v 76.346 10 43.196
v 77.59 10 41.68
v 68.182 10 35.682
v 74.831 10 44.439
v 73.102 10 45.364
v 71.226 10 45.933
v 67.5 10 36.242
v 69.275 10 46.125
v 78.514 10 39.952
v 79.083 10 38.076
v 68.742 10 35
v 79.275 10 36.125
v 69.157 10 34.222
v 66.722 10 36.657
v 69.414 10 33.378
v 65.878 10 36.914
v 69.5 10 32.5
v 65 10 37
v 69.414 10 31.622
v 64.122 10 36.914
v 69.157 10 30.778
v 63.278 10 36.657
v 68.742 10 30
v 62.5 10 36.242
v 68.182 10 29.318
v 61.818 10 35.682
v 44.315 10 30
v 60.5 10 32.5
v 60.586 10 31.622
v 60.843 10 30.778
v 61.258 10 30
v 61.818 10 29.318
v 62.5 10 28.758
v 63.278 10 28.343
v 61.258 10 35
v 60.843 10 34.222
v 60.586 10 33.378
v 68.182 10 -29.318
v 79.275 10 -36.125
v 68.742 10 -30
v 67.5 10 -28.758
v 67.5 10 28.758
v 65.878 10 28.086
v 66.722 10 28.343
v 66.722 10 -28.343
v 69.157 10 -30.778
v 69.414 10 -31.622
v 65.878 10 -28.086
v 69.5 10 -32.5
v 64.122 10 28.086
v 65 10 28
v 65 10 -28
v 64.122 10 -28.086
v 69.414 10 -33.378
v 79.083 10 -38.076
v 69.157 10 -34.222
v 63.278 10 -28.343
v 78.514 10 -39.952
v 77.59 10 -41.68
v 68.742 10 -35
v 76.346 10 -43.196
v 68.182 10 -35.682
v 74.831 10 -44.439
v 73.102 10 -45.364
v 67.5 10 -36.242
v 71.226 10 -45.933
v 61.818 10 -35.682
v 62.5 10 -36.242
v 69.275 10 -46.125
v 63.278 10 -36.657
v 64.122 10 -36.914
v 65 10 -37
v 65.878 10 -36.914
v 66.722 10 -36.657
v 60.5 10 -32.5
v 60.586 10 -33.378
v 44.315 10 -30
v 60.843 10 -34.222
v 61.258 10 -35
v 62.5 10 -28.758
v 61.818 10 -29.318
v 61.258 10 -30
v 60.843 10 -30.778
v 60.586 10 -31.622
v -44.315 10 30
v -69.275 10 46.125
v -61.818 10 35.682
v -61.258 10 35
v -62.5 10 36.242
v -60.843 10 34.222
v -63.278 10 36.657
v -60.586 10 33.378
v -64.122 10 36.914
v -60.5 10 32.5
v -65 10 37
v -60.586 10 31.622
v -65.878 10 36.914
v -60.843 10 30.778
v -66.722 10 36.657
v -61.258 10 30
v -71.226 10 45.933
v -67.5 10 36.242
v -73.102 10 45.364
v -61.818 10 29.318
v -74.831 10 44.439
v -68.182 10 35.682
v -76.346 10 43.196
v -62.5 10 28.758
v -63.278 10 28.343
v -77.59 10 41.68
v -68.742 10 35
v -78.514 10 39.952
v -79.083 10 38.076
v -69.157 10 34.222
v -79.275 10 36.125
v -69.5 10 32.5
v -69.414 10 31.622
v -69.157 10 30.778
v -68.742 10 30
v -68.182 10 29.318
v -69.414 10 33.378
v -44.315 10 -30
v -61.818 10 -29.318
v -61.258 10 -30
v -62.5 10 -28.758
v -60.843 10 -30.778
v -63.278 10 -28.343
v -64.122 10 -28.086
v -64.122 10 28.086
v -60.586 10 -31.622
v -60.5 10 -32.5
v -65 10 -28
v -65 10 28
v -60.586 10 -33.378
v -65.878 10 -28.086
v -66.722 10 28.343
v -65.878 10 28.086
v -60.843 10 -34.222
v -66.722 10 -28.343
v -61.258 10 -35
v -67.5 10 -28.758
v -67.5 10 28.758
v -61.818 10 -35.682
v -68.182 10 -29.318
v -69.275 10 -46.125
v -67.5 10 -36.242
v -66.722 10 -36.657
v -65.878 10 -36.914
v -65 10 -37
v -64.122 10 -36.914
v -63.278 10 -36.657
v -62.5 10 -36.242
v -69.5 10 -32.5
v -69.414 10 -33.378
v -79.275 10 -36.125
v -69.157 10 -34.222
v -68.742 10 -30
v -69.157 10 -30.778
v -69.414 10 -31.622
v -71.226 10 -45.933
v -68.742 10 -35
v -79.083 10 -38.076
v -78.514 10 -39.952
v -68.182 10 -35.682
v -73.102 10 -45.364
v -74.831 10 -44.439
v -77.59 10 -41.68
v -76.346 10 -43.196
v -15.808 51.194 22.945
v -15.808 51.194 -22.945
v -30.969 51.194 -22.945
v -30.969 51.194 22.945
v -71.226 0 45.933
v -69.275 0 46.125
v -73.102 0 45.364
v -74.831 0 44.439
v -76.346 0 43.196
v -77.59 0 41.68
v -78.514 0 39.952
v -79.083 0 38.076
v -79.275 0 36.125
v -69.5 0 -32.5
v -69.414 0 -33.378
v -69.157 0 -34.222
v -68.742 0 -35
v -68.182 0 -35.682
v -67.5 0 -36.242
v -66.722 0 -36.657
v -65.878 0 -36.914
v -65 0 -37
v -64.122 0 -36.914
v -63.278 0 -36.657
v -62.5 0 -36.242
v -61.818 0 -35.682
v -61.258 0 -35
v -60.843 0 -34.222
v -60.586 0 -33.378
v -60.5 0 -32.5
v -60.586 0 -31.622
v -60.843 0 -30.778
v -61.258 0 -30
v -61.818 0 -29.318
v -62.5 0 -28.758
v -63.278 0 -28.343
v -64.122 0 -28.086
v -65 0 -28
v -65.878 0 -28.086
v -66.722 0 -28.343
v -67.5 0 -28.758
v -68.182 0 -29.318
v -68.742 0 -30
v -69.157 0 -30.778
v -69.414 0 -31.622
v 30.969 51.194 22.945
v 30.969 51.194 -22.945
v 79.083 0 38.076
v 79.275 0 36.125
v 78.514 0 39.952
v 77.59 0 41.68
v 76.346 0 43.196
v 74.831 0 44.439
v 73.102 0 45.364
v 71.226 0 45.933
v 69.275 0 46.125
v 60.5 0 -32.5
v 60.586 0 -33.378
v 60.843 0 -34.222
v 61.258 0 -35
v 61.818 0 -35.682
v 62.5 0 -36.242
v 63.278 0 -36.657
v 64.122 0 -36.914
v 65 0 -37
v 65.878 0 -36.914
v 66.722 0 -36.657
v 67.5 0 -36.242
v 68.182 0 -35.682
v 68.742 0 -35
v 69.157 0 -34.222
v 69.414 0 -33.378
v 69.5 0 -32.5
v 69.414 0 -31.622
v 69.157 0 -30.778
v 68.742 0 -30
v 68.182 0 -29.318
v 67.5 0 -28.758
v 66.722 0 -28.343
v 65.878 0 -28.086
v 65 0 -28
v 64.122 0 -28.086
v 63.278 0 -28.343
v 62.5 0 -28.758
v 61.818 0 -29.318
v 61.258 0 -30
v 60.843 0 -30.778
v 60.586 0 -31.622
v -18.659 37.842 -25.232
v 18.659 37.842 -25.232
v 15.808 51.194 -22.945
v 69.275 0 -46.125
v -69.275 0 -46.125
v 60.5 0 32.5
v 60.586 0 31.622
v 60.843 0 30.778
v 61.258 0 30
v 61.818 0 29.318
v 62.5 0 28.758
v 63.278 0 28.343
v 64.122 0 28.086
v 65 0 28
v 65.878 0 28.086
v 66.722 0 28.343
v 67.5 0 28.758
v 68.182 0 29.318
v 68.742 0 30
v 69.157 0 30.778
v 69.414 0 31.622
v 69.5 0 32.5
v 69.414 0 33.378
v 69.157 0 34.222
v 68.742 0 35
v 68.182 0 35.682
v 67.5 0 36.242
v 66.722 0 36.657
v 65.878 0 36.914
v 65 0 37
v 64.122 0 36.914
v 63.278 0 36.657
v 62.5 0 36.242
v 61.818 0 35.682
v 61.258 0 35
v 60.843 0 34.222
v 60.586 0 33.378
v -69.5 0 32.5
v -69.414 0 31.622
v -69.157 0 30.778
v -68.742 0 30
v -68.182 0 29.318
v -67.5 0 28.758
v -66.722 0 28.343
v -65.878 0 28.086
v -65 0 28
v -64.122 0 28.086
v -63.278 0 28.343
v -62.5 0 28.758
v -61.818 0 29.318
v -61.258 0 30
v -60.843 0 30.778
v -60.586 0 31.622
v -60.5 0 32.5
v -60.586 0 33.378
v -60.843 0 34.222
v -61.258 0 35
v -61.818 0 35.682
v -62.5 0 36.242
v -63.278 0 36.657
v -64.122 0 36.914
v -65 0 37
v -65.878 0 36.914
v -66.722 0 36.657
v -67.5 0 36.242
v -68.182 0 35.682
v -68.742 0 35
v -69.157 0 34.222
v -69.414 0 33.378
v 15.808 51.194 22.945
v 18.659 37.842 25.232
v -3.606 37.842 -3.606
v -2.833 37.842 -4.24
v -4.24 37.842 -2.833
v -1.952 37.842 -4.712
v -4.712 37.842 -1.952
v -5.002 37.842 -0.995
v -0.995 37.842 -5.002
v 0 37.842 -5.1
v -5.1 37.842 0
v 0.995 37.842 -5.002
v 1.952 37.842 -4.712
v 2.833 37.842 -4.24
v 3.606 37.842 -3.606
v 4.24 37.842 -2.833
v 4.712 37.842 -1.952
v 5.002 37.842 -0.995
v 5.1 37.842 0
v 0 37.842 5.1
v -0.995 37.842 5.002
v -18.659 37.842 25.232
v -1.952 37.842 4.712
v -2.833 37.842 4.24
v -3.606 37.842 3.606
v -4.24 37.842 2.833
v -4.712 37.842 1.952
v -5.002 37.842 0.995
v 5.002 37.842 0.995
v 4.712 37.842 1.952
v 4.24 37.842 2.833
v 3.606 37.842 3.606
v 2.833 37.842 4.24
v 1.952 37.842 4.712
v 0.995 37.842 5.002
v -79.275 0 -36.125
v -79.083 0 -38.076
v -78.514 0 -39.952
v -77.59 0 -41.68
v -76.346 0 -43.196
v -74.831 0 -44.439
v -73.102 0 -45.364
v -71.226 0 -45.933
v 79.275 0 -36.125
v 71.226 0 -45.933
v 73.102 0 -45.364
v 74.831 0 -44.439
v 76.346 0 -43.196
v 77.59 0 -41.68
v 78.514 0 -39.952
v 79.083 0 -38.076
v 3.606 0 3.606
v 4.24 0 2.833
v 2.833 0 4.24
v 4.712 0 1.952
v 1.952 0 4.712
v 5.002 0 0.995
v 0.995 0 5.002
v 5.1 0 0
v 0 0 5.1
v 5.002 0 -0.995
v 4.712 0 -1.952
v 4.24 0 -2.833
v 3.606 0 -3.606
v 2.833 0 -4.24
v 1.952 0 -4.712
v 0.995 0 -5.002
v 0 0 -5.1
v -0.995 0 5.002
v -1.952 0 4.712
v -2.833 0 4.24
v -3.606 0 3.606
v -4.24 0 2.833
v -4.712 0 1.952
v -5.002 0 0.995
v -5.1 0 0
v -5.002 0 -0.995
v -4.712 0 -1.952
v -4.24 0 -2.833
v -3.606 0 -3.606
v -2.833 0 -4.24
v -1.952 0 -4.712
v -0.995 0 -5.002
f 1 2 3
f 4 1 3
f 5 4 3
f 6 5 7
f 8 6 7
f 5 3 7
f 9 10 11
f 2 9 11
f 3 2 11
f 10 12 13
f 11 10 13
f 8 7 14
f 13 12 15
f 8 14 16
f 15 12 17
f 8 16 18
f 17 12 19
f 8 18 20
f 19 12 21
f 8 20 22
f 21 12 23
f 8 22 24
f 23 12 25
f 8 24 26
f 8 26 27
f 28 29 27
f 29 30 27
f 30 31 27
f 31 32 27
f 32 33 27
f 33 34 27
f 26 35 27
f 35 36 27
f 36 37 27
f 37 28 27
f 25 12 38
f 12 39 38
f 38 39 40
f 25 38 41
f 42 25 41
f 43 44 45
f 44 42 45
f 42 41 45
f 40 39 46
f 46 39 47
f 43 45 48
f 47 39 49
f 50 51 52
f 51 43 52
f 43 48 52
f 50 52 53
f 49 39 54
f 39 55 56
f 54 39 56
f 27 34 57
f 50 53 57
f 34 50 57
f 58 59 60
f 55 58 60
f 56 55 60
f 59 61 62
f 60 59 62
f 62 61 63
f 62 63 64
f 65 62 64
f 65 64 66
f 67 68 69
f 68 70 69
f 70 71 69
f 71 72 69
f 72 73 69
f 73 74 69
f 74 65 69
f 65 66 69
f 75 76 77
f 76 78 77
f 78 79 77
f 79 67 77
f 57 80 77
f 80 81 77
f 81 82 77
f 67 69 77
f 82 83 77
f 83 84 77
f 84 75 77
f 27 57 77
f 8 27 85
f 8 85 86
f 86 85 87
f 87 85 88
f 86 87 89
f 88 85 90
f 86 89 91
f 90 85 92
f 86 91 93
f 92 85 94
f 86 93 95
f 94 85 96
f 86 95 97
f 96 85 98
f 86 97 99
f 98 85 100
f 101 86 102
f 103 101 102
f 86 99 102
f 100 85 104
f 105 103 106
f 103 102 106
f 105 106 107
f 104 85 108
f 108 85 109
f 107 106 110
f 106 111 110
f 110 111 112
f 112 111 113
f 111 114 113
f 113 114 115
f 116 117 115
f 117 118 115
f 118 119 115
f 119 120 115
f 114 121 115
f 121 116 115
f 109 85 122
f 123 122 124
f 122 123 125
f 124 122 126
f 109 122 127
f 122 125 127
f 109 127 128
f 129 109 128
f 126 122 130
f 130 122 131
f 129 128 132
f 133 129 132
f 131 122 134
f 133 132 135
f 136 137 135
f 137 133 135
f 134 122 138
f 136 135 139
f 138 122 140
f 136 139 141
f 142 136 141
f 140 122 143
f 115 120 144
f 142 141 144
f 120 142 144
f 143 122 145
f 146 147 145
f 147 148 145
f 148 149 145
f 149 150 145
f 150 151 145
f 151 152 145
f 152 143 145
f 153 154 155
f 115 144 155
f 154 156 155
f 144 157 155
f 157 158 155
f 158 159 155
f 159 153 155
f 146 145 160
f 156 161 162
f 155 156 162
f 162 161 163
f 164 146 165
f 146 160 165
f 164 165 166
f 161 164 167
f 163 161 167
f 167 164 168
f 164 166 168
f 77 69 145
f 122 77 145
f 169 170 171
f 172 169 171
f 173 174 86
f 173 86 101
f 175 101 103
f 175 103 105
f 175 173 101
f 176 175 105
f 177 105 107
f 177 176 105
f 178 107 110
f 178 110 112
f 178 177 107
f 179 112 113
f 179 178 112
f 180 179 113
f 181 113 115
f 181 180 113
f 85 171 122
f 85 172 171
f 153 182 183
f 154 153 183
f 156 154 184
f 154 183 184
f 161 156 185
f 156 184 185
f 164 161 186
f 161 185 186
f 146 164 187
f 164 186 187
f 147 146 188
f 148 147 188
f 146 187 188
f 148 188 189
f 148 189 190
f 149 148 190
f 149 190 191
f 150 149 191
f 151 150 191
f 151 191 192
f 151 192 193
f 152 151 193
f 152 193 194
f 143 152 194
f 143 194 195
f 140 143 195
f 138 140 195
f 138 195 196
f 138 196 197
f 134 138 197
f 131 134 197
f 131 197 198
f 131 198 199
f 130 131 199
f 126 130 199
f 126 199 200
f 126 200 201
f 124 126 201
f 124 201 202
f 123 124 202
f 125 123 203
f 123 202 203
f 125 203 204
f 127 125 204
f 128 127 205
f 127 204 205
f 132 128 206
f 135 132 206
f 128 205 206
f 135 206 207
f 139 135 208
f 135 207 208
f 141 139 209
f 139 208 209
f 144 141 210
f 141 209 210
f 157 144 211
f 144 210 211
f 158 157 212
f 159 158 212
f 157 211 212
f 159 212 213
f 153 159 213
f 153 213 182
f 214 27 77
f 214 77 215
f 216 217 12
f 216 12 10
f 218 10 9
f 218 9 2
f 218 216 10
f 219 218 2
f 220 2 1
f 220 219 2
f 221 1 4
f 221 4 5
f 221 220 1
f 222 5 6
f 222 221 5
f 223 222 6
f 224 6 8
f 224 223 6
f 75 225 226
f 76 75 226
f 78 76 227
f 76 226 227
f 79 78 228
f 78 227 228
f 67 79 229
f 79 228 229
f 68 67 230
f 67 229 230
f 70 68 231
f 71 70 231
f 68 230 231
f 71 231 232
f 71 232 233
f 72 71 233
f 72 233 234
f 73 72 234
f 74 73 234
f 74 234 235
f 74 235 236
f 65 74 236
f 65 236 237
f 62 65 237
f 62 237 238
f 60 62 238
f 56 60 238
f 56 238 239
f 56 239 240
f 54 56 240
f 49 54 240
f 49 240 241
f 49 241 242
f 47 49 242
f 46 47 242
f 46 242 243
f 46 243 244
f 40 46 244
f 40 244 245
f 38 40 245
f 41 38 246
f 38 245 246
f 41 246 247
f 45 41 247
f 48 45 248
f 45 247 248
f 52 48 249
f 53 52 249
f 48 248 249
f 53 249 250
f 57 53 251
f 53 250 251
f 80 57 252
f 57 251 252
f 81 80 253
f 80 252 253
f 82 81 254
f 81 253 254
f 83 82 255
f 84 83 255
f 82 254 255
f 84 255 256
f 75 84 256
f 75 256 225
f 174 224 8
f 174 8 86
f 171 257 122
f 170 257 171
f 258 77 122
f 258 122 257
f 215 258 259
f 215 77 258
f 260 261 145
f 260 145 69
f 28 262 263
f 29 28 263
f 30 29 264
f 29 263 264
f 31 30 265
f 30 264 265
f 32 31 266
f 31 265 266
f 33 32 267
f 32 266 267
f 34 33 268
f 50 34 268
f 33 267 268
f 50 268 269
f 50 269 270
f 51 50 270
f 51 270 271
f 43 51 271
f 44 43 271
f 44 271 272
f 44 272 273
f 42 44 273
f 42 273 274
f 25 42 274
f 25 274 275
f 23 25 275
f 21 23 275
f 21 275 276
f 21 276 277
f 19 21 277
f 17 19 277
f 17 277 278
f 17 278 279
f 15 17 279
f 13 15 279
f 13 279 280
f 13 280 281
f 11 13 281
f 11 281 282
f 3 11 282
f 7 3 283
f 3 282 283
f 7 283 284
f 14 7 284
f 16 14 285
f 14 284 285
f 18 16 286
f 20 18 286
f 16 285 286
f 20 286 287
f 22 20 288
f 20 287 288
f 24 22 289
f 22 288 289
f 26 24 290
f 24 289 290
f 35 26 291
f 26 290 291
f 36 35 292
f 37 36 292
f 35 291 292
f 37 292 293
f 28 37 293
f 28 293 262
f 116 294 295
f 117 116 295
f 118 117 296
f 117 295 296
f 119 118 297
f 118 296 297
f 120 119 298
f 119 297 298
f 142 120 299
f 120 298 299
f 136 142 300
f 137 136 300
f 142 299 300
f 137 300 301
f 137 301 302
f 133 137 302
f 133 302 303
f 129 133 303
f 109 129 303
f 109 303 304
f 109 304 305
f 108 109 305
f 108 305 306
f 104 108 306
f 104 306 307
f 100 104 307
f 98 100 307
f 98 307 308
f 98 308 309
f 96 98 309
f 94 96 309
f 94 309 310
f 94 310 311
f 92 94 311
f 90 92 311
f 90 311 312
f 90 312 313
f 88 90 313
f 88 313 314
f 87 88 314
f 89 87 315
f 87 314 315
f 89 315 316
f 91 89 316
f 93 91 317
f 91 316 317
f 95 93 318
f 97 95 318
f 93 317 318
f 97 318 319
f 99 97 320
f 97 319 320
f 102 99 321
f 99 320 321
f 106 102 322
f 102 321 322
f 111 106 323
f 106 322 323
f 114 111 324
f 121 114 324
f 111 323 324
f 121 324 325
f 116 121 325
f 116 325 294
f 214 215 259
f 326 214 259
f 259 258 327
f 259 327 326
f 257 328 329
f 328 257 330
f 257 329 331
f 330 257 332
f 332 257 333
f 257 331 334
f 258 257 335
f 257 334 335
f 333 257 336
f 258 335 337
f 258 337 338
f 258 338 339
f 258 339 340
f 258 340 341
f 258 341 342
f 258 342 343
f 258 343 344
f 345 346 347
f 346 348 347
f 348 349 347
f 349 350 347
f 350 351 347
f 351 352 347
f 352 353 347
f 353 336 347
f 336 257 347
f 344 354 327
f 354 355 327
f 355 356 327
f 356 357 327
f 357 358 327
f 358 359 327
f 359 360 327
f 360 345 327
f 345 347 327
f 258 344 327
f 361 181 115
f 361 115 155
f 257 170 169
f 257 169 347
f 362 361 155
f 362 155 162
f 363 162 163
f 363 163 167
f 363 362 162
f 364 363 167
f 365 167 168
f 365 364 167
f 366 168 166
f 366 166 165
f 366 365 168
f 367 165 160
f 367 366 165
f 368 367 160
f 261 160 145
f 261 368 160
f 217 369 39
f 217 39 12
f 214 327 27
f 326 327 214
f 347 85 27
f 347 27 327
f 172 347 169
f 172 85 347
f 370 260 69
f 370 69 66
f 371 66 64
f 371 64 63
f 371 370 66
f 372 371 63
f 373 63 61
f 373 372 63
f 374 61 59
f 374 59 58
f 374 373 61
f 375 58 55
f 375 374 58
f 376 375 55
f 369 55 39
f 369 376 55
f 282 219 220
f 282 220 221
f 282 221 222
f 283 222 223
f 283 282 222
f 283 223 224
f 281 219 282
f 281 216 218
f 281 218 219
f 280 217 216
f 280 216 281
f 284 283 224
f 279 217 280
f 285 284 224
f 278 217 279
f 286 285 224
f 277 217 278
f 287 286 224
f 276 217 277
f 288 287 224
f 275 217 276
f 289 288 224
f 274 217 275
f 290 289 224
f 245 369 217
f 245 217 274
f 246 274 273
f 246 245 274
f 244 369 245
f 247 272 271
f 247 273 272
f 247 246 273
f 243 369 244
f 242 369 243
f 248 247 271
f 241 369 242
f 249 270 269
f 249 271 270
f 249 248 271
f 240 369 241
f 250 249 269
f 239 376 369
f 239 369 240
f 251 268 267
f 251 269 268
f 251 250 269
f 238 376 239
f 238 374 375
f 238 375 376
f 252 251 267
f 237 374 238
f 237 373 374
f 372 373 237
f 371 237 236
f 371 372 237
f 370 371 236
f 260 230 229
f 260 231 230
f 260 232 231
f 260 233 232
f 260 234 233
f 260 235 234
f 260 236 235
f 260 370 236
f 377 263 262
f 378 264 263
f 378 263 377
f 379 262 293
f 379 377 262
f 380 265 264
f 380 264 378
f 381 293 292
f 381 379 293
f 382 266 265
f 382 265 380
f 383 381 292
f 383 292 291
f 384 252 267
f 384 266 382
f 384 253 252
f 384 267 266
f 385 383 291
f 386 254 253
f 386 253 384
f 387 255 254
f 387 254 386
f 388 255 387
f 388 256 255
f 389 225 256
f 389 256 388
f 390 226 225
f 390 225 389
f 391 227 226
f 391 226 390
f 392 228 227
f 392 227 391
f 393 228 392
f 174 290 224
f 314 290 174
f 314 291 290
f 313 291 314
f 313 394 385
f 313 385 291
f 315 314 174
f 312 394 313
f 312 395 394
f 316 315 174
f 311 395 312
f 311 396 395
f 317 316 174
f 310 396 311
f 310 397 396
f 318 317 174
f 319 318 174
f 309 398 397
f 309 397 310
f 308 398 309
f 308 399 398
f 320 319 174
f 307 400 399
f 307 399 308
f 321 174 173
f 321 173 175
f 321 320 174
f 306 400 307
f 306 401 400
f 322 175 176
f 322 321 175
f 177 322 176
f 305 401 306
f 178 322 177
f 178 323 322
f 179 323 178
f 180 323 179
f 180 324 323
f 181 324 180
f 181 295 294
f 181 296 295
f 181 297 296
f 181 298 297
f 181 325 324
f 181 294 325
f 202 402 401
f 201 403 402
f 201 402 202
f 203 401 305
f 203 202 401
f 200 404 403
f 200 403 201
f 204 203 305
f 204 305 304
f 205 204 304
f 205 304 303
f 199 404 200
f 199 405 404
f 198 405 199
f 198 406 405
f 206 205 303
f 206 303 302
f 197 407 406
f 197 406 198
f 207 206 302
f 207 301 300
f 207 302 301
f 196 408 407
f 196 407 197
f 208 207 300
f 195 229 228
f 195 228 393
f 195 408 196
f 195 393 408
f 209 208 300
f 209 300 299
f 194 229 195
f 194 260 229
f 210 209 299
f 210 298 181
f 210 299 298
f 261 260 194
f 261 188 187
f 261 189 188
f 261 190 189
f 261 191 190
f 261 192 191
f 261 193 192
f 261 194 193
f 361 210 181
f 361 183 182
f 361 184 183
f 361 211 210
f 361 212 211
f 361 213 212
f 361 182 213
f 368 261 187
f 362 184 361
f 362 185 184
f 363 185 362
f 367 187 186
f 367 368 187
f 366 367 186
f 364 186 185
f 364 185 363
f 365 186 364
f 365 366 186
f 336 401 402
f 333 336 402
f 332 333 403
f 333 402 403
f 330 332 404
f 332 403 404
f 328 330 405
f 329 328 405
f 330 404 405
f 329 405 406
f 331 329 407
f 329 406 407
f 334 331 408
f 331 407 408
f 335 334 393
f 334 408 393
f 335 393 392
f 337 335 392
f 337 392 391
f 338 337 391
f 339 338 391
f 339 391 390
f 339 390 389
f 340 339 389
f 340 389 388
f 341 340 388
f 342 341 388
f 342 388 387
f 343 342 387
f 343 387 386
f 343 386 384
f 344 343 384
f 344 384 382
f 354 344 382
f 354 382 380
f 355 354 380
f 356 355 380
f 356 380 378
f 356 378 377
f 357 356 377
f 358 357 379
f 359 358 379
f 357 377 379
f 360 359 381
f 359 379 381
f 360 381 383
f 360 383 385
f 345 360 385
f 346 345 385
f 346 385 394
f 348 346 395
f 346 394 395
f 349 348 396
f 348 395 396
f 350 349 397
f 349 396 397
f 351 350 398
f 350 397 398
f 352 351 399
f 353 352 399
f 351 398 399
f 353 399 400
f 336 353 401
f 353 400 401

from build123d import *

# Parameters (mm, degrees)
AUFSATZ_LINEAR_AUSTRAGEN1_DEPTH      = 10
AUFSATZ_LINEAR_AUSTRAGEN2_DEPTH      = 30
SCHNITT_LINEAR_AUSTRAGEN1_DEPTH      = 80.274901172
SCHNITT_LINEAR_AUSTRAGEN1_DEPTH_BACK = 80.274901172
SCHNITT_LINEAR_AUSTRAGEN2_DEPTH      = 47.124758374
SCHNITT_LINEAR_AUSTRAGEN2_DEPTH_BACK = 47.124758374
DURCHGANGSLOCH_F_R_M81_D             = 9
M12_GEWINDEBOHRUNG1_D                = 10.2


with BuildPart() as part:
    # Skizze1 → Aufsatz-Linear austragen1 (new body)
    with BuildSketch(Plane(origin=(0, 0, 0), x_dir=(1, 0, 0), z_dir=(0, 1, 0))):
        with BuildLine():
            Line((-69.274901172, 46.124758374), (69.274901172, 46.124758374))
            ThreePointArc((69.274901172, 46.124758374), (76.345968983, 43.195826186), (79.274901172, 36.124758374))
            Line((79.274901172, 36.124758374), (79.274901172, -36.124758374))
            ThreePointArc((79.274901172, -36.124758374), (76.345968983, -43.195826186), (69.274901172, -46.124758374))
            Line((69.274901172, -46.124758374), (-69.274901172, -46.124758374))
            ThreePointArc((-69.274901172, -46.124758374), (-76.345968983, -43.195826186), (-79.274901172, -36.124758374))
            Line((-79.274901172, -36.124758374), (-79.274901172, 36.124758374))
            ThreePointArc((-79.274901172, 36.124758374), (-76.345968983, 43.195826186), (-69.274901172, 46.124758374))
        make_face()
    extrude(amount=AUFSATZ_LINEAR_AUSTRAGEN1_DEPTH)

    # Skizze2 → Aufsatz-Linear austragen2 (add, symmetric)
    with BuildSketch(Plane.XY):
        Polygon((-30.968636567, 51.19380308), (-44.314952745, 10), (44.314952745, 10), (30.968636567, 51.19380308), align=None)
    extrude(amount=AUFSATZ_LINEAR_AUSTRAGEN2_DEPTH, both=True)

    # Skizze3 → Schnitt-Linear austragen1 (cut, two sides)
    with BuildSketch(Plane(origin=(0, 0, 0), x_dir=(0, 0, -1), z_dir=(1, 0, 0))) as schnitt_linear_austragen1_sk:
        Polygon((-30, 10), (-22.945404255, 51.19380308), (-30, 51.19380308), align=None)
        Polygon((30, 51.19380308), (30, 10), (22.945404255, 51.19380308), align=None)
    extrude(amount=SCHNITT_LINEAR_AUSTRAGEN1_DEPTH, mode=Mode.SUBTRACT)
    extrude(schnitt_linear_austragen1_sk.sketch, amount=-SCHNITT_LINEAR_AUSTRAGEN1_DEPTH_BACK, mode=Mode.SUBTRACT)

    # Skizze4 → Schnitt-Linear austragen2 (cut, two sides)
    with BuildSketch(Plane.XY) as schnitt_linear_austragen2_sk:
        Polygon((-15.808257997, 51.19380308), (-18.658927471, 37.841822693), (18.658927471, 37.841822693), (15.808257997, 51.19380308), align=None)
    extrude(amount=SCHNITT_LINEAR_AUSTRAGEN2_DEPTH, mode=Mode.SUBTRACT)
    extrude(schnitt_linear_austragen2_sk.sketch, amount=-SCHNITT_LINEAR_AUSTRAGEN2_DEPTH_BACK, mode=Mode.SUBTRACT)

    # Durchgangsloch für M81 (through all)
    with Locations(Plane(origin=(0, 10, 0), x_dir=(1, 0, 0), z_dir=(0, 1, 0))):
        with Locations((-65, 32.5), (65, 32.5), (65, -32.5), (-65, -32.5)):
            Hole(DURCHGANGSLOCH_F_R_M81_D / 2)

    # M12 Gewindebohrung1 (through all)
    with Locations(Plane(origin=(0, 37.841822693, 0), x_dir=(1, 0, 0), z_dir=(0, 1, 0))):
        with Locations((0, 0)):
            Hole(M12_GEWINDEBOHRUNG1_D / 2)


solid = part.part
